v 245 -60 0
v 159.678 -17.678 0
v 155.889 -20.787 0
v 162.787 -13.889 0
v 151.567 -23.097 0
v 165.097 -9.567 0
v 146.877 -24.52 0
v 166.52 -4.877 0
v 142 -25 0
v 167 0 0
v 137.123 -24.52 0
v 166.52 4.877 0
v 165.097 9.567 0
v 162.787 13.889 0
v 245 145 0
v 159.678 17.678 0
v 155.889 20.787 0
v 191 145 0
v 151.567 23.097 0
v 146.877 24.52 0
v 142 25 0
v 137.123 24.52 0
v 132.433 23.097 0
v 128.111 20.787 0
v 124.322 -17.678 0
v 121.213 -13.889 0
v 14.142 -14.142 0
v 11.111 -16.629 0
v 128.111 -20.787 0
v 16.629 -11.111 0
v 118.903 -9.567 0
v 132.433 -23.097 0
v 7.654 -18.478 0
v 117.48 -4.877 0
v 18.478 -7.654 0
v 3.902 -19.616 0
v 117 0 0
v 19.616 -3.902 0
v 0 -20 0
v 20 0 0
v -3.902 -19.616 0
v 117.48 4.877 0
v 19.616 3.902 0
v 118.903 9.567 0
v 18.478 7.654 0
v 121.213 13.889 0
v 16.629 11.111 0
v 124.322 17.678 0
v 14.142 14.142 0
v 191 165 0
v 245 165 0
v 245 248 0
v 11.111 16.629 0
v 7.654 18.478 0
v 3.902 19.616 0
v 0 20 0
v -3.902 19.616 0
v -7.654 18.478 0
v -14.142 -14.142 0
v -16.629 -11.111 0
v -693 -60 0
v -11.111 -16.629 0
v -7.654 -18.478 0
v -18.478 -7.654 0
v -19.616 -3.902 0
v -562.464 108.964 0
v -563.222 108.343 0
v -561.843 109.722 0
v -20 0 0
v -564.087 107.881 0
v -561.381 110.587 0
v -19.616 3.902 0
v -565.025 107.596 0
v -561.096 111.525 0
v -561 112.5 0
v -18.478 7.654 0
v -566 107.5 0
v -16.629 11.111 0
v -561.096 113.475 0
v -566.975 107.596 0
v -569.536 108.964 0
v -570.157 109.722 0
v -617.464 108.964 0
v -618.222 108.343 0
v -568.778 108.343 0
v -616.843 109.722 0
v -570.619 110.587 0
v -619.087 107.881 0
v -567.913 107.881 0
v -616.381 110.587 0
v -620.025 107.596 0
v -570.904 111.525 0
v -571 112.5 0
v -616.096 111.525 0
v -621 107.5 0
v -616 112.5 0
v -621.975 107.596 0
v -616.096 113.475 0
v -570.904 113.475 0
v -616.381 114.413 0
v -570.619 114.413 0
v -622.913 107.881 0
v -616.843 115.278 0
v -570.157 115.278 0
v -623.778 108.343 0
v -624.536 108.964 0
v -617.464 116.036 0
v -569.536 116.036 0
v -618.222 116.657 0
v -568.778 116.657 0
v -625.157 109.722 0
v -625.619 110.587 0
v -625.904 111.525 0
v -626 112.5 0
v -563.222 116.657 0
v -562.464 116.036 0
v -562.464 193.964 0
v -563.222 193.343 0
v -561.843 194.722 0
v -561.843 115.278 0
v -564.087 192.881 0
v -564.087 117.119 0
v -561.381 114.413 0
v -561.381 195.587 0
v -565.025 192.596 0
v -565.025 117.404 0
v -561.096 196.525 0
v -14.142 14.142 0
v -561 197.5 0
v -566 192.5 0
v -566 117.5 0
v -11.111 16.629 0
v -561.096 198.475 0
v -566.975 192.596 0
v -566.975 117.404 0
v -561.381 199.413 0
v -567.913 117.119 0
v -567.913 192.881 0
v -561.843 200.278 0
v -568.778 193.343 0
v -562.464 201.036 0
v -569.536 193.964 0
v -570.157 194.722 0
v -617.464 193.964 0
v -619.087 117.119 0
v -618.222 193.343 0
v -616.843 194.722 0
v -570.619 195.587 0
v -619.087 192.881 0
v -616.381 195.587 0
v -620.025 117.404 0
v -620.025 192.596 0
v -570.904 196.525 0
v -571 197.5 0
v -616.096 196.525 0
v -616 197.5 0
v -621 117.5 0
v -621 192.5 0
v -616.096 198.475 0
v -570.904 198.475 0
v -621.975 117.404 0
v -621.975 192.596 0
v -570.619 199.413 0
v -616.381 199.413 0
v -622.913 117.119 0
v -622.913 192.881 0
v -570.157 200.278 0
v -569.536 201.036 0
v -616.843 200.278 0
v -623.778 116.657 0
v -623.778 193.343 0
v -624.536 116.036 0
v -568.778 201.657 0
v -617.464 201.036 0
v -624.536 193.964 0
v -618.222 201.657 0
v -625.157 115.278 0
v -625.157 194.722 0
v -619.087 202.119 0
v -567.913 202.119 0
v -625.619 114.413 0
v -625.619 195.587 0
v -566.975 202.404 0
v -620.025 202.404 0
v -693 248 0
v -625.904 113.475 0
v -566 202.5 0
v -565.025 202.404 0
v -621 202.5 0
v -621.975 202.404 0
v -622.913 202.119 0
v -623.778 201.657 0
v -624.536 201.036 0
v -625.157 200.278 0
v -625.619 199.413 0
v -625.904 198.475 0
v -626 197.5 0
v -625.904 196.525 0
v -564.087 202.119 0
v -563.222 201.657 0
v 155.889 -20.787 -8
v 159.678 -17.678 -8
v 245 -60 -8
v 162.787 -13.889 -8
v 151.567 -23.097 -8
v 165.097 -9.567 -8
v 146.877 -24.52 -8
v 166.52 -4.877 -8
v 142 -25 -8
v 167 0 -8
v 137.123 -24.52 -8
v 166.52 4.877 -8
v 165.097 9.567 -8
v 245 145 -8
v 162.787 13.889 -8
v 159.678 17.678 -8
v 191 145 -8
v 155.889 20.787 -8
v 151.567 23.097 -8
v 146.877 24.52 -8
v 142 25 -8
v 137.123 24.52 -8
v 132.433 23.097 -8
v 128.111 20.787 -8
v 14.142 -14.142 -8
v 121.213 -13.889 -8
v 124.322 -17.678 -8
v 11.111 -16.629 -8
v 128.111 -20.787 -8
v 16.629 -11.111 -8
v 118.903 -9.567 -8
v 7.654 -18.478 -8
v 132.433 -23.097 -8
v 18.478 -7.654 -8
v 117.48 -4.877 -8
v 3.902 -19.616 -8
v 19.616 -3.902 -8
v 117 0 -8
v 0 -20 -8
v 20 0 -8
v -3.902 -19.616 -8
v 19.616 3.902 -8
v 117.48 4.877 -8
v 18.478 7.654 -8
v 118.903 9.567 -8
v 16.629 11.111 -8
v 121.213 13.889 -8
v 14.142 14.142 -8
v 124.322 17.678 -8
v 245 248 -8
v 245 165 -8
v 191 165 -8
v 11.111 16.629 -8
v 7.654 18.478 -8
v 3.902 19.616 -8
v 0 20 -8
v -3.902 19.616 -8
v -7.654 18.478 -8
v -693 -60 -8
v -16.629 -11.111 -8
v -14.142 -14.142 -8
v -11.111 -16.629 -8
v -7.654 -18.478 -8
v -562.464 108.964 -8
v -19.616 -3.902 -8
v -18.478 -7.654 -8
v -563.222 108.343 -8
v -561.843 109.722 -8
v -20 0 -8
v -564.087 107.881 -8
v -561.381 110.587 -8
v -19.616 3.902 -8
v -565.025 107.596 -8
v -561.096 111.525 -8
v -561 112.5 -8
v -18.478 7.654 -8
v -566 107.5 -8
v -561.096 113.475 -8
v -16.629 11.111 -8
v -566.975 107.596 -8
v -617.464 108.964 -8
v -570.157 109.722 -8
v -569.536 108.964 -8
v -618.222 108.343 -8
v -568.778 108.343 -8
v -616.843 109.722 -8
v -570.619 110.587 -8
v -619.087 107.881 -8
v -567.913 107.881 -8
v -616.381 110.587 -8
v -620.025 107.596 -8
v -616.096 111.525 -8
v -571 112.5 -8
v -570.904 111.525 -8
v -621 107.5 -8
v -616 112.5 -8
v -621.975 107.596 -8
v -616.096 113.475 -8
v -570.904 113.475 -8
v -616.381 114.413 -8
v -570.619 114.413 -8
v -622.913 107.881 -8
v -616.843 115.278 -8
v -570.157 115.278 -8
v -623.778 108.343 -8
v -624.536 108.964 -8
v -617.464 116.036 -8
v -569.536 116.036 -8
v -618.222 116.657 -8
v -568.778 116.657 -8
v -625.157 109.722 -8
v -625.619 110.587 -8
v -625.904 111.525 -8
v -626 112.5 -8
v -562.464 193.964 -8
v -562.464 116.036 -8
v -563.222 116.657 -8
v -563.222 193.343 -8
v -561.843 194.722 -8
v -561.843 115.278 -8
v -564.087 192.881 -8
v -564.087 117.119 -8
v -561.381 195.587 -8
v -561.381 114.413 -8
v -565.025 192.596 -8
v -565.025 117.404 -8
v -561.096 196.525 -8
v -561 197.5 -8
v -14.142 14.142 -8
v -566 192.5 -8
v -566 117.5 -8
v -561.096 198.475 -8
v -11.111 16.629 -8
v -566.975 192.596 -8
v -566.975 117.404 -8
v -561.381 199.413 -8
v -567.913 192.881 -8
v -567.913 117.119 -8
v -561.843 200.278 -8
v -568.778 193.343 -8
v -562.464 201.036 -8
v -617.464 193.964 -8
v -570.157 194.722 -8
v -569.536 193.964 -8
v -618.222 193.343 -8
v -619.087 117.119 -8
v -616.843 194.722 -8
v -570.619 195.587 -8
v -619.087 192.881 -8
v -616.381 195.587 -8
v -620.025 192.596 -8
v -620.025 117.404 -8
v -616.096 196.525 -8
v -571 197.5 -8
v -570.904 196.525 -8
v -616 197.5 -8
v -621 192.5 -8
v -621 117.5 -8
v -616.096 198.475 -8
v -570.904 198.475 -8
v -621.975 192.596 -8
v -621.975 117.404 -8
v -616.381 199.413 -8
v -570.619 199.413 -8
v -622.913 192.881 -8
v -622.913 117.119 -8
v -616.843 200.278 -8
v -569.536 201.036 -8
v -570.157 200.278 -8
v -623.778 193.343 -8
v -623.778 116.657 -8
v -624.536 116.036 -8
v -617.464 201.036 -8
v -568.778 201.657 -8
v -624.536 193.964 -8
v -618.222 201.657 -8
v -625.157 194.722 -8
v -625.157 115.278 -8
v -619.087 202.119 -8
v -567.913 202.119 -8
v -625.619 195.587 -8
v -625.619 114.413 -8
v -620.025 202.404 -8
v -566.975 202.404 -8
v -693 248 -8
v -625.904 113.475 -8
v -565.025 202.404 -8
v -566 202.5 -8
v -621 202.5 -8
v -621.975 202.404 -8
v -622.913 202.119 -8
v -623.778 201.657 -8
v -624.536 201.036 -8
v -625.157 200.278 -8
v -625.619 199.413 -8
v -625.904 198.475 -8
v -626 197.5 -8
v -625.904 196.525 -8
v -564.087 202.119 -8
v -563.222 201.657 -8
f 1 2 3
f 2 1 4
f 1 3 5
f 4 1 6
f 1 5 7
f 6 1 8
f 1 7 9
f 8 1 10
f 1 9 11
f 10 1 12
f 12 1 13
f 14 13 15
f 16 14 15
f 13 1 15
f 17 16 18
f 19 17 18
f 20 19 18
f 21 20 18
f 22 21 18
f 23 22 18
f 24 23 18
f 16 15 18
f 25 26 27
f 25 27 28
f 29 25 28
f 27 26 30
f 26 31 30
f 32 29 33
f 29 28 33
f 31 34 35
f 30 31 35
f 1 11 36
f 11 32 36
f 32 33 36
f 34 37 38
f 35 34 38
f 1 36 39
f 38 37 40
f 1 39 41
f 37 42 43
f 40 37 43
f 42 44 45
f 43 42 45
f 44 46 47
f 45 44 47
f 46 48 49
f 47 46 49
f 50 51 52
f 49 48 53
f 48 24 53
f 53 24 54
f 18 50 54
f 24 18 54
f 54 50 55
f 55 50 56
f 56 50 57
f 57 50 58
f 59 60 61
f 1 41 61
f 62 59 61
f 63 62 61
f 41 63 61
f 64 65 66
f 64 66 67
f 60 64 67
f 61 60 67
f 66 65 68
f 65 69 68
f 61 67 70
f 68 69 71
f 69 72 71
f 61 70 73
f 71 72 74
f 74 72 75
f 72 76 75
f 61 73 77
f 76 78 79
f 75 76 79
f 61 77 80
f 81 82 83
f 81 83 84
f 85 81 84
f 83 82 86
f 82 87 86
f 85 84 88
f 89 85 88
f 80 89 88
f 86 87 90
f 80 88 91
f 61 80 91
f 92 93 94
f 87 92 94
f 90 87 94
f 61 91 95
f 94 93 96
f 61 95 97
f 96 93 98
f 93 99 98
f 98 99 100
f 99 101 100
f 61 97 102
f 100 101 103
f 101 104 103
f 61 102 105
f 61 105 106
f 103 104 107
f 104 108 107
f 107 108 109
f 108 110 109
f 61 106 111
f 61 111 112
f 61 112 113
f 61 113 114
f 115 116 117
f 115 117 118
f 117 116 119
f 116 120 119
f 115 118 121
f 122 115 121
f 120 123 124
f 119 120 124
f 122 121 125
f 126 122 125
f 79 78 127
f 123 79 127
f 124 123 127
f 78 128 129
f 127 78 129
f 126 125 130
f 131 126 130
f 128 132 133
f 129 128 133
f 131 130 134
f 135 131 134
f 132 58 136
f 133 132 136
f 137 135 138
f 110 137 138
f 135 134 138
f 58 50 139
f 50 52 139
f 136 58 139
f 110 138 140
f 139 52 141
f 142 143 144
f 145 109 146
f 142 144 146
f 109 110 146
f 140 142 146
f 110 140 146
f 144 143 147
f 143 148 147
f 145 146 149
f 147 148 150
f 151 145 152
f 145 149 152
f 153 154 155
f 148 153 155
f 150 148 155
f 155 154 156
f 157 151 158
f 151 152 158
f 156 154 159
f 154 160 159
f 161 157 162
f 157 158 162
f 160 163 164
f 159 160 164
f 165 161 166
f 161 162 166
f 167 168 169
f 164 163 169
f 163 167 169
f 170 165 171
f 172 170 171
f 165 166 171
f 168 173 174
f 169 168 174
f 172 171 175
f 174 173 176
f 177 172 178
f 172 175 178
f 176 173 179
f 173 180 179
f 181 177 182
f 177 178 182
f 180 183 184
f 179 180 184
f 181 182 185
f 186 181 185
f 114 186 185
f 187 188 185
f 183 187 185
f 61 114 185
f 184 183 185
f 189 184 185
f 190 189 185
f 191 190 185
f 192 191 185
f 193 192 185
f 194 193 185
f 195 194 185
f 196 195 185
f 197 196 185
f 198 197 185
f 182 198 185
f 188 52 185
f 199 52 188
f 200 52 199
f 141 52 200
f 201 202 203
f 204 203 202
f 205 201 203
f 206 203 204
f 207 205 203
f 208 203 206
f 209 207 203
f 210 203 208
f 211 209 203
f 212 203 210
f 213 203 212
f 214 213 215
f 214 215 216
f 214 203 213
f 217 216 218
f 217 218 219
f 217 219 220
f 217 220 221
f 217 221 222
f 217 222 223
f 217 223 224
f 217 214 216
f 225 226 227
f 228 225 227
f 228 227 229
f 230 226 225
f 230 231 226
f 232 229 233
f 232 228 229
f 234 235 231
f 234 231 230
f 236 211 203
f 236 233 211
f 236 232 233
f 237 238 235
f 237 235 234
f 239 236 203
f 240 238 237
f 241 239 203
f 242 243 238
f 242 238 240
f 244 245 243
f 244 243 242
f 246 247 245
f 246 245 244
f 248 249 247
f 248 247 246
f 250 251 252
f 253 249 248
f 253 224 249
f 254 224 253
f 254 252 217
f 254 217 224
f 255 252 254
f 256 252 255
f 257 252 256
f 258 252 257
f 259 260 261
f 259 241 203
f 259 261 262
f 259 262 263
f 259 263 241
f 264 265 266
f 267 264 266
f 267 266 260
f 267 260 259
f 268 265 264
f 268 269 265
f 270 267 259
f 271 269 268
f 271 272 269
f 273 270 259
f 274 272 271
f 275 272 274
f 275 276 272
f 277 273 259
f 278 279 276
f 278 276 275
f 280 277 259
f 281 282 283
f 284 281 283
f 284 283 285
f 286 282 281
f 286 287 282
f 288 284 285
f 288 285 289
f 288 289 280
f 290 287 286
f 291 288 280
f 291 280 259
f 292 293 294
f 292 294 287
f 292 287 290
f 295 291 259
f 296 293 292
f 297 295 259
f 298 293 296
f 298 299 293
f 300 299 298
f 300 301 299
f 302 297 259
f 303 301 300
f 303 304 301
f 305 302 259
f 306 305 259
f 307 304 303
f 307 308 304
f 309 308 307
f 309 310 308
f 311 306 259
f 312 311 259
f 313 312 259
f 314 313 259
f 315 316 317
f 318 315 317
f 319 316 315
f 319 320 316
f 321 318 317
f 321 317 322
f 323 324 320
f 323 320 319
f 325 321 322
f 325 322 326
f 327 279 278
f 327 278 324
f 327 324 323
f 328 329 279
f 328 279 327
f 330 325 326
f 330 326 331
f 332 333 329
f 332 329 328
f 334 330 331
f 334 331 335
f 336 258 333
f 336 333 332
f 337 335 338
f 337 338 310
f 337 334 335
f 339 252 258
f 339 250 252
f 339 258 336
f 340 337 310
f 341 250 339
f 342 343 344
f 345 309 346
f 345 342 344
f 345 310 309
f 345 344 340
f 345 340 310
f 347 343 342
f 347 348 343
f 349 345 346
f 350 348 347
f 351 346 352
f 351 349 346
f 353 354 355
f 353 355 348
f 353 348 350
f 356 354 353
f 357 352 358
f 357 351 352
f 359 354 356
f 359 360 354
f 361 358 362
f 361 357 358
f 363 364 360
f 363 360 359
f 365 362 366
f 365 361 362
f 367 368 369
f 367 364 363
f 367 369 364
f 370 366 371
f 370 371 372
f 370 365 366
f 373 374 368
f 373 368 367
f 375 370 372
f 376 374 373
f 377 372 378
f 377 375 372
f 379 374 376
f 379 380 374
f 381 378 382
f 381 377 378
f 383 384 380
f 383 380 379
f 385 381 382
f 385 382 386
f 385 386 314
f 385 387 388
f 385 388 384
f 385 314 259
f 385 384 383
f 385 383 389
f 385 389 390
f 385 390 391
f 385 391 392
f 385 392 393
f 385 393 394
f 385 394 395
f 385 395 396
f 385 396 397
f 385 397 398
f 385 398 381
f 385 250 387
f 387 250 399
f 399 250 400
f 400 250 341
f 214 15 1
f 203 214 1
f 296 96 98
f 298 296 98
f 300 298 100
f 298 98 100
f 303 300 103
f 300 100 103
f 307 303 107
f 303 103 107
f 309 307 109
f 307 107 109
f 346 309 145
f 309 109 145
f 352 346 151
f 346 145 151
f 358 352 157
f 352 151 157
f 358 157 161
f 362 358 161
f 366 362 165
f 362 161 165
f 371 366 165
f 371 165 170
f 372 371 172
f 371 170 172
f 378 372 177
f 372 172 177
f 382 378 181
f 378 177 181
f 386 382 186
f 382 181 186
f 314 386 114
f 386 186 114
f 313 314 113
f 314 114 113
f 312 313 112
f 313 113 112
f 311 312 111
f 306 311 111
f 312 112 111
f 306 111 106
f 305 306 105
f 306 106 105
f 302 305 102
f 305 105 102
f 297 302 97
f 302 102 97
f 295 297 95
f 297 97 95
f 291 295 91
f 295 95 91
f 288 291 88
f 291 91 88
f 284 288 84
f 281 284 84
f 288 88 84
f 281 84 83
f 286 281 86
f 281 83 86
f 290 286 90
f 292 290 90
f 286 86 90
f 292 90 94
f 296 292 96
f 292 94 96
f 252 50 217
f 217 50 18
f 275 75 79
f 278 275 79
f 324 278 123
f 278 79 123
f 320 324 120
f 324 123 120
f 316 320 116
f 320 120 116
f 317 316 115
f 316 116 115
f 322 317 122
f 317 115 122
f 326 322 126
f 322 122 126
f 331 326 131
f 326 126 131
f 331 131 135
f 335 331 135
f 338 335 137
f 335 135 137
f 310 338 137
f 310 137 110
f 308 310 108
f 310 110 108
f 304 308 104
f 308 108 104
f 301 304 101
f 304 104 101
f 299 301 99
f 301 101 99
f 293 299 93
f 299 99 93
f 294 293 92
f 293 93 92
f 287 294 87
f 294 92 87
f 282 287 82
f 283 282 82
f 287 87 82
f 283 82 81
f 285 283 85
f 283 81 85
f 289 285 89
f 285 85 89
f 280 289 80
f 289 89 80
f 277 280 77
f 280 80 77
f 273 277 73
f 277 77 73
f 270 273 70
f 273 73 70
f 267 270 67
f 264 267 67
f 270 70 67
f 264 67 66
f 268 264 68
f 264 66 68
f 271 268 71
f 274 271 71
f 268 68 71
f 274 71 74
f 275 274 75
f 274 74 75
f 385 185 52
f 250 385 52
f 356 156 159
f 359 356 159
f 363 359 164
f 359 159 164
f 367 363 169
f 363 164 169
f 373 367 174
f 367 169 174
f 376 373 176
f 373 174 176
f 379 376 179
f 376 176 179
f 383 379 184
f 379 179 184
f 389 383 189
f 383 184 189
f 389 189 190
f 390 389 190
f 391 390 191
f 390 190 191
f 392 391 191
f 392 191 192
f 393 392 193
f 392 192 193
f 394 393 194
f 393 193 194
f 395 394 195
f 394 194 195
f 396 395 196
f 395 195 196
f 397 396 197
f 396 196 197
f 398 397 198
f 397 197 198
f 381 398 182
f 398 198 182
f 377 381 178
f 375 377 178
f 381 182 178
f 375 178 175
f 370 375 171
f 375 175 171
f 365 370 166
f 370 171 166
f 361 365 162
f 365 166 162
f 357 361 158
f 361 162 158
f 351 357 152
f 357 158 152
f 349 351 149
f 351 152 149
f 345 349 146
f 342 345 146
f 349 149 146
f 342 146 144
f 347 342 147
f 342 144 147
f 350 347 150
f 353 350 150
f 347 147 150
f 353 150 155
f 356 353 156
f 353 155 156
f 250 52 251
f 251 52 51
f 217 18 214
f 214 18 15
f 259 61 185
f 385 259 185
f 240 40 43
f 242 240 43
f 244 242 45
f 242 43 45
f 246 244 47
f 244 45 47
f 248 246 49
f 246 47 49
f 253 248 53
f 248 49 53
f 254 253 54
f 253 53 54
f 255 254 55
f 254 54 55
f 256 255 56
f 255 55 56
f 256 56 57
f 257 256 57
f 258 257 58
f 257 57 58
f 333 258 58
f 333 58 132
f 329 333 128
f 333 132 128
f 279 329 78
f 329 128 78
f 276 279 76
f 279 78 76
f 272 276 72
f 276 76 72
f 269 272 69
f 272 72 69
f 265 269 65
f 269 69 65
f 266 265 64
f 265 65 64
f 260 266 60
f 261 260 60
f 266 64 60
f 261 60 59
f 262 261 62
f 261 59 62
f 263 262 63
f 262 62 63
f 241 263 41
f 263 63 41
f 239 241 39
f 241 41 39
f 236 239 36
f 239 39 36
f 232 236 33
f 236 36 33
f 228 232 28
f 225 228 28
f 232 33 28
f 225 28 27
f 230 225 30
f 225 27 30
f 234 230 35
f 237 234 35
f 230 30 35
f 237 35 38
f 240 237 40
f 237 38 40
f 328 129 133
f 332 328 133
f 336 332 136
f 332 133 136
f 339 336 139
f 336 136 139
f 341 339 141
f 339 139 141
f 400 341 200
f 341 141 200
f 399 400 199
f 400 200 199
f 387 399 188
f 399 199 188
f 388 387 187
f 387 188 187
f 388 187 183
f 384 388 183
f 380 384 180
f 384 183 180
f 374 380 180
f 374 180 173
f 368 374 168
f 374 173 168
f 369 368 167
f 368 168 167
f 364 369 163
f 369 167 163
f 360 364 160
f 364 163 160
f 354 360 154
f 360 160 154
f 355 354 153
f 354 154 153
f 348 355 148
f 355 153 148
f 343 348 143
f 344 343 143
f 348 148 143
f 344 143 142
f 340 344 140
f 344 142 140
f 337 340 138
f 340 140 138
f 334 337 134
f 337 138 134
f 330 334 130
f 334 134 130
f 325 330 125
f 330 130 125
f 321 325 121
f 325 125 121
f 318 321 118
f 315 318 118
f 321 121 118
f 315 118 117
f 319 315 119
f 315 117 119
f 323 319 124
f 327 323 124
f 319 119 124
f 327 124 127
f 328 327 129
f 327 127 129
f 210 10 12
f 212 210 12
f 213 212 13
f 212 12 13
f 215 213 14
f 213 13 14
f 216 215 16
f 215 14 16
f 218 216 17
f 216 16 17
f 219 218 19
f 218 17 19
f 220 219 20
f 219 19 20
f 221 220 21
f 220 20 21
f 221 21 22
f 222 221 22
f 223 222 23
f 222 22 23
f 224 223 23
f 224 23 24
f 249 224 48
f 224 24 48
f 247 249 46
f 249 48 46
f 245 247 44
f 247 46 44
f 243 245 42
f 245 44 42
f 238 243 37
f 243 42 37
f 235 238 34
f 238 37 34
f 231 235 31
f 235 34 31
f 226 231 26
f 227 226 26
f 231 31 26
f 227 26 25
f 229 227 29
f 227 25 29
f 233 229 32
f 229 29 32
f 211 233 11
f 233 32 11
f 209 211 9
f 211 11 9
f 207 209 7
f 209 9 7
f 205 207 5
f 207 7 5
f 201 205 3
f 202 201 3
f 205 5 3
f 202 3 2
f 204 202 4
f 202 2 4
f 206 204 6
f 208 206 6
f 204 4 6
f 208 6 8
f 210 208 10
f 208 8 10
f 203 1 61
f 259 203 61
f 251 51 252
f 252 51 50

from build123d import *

# Parameters (mm, degrees)
ESQUISSEREF_R    = 20
ESQUISSEREF_R_2  = 5
ESQUISSEREF_R_3  = 25
EXTRUSION1_DEPTH = 8


with BuildPart() as part:
    # EsquisseRef → Extrusion1 (new body)
    with BuildSketch(Plane.XY):
        Polygon((-693, 248), (245, 248), (245, 165), (191, 165), (191, 145), (245, 145), (245, -60), (-693, -60), align=None)
        Circle(ESQUISSEREF_R, mode=Mode.SUBTRACT)
        with Locations((-621, 197.5)):
            Circle(ESQUISSEREF_R_2, mode=Mode.SUBTRACT)
        with Locations((-566, 197.5)):
            Circle(ESQUISSEREF_R_2, mode=Mode.SUBTRACT)
        with Locations((-566, 112.5)):
            Circle(ESQUISSEREF_R_2, mode=Mode.SUBTRACT)
        with Locations((-621, 112.5)):
            Circle(ESQUISSEREF_R_2, mode=Mode.SUBTRACT)
        with Locations((142, 0)):
            Circle(ESQUISSEREF_R_3, mode=Mode.SUBTRACT)
    extrude(amount=-EXTRUSION1_DEPTH)


solid = part.part
